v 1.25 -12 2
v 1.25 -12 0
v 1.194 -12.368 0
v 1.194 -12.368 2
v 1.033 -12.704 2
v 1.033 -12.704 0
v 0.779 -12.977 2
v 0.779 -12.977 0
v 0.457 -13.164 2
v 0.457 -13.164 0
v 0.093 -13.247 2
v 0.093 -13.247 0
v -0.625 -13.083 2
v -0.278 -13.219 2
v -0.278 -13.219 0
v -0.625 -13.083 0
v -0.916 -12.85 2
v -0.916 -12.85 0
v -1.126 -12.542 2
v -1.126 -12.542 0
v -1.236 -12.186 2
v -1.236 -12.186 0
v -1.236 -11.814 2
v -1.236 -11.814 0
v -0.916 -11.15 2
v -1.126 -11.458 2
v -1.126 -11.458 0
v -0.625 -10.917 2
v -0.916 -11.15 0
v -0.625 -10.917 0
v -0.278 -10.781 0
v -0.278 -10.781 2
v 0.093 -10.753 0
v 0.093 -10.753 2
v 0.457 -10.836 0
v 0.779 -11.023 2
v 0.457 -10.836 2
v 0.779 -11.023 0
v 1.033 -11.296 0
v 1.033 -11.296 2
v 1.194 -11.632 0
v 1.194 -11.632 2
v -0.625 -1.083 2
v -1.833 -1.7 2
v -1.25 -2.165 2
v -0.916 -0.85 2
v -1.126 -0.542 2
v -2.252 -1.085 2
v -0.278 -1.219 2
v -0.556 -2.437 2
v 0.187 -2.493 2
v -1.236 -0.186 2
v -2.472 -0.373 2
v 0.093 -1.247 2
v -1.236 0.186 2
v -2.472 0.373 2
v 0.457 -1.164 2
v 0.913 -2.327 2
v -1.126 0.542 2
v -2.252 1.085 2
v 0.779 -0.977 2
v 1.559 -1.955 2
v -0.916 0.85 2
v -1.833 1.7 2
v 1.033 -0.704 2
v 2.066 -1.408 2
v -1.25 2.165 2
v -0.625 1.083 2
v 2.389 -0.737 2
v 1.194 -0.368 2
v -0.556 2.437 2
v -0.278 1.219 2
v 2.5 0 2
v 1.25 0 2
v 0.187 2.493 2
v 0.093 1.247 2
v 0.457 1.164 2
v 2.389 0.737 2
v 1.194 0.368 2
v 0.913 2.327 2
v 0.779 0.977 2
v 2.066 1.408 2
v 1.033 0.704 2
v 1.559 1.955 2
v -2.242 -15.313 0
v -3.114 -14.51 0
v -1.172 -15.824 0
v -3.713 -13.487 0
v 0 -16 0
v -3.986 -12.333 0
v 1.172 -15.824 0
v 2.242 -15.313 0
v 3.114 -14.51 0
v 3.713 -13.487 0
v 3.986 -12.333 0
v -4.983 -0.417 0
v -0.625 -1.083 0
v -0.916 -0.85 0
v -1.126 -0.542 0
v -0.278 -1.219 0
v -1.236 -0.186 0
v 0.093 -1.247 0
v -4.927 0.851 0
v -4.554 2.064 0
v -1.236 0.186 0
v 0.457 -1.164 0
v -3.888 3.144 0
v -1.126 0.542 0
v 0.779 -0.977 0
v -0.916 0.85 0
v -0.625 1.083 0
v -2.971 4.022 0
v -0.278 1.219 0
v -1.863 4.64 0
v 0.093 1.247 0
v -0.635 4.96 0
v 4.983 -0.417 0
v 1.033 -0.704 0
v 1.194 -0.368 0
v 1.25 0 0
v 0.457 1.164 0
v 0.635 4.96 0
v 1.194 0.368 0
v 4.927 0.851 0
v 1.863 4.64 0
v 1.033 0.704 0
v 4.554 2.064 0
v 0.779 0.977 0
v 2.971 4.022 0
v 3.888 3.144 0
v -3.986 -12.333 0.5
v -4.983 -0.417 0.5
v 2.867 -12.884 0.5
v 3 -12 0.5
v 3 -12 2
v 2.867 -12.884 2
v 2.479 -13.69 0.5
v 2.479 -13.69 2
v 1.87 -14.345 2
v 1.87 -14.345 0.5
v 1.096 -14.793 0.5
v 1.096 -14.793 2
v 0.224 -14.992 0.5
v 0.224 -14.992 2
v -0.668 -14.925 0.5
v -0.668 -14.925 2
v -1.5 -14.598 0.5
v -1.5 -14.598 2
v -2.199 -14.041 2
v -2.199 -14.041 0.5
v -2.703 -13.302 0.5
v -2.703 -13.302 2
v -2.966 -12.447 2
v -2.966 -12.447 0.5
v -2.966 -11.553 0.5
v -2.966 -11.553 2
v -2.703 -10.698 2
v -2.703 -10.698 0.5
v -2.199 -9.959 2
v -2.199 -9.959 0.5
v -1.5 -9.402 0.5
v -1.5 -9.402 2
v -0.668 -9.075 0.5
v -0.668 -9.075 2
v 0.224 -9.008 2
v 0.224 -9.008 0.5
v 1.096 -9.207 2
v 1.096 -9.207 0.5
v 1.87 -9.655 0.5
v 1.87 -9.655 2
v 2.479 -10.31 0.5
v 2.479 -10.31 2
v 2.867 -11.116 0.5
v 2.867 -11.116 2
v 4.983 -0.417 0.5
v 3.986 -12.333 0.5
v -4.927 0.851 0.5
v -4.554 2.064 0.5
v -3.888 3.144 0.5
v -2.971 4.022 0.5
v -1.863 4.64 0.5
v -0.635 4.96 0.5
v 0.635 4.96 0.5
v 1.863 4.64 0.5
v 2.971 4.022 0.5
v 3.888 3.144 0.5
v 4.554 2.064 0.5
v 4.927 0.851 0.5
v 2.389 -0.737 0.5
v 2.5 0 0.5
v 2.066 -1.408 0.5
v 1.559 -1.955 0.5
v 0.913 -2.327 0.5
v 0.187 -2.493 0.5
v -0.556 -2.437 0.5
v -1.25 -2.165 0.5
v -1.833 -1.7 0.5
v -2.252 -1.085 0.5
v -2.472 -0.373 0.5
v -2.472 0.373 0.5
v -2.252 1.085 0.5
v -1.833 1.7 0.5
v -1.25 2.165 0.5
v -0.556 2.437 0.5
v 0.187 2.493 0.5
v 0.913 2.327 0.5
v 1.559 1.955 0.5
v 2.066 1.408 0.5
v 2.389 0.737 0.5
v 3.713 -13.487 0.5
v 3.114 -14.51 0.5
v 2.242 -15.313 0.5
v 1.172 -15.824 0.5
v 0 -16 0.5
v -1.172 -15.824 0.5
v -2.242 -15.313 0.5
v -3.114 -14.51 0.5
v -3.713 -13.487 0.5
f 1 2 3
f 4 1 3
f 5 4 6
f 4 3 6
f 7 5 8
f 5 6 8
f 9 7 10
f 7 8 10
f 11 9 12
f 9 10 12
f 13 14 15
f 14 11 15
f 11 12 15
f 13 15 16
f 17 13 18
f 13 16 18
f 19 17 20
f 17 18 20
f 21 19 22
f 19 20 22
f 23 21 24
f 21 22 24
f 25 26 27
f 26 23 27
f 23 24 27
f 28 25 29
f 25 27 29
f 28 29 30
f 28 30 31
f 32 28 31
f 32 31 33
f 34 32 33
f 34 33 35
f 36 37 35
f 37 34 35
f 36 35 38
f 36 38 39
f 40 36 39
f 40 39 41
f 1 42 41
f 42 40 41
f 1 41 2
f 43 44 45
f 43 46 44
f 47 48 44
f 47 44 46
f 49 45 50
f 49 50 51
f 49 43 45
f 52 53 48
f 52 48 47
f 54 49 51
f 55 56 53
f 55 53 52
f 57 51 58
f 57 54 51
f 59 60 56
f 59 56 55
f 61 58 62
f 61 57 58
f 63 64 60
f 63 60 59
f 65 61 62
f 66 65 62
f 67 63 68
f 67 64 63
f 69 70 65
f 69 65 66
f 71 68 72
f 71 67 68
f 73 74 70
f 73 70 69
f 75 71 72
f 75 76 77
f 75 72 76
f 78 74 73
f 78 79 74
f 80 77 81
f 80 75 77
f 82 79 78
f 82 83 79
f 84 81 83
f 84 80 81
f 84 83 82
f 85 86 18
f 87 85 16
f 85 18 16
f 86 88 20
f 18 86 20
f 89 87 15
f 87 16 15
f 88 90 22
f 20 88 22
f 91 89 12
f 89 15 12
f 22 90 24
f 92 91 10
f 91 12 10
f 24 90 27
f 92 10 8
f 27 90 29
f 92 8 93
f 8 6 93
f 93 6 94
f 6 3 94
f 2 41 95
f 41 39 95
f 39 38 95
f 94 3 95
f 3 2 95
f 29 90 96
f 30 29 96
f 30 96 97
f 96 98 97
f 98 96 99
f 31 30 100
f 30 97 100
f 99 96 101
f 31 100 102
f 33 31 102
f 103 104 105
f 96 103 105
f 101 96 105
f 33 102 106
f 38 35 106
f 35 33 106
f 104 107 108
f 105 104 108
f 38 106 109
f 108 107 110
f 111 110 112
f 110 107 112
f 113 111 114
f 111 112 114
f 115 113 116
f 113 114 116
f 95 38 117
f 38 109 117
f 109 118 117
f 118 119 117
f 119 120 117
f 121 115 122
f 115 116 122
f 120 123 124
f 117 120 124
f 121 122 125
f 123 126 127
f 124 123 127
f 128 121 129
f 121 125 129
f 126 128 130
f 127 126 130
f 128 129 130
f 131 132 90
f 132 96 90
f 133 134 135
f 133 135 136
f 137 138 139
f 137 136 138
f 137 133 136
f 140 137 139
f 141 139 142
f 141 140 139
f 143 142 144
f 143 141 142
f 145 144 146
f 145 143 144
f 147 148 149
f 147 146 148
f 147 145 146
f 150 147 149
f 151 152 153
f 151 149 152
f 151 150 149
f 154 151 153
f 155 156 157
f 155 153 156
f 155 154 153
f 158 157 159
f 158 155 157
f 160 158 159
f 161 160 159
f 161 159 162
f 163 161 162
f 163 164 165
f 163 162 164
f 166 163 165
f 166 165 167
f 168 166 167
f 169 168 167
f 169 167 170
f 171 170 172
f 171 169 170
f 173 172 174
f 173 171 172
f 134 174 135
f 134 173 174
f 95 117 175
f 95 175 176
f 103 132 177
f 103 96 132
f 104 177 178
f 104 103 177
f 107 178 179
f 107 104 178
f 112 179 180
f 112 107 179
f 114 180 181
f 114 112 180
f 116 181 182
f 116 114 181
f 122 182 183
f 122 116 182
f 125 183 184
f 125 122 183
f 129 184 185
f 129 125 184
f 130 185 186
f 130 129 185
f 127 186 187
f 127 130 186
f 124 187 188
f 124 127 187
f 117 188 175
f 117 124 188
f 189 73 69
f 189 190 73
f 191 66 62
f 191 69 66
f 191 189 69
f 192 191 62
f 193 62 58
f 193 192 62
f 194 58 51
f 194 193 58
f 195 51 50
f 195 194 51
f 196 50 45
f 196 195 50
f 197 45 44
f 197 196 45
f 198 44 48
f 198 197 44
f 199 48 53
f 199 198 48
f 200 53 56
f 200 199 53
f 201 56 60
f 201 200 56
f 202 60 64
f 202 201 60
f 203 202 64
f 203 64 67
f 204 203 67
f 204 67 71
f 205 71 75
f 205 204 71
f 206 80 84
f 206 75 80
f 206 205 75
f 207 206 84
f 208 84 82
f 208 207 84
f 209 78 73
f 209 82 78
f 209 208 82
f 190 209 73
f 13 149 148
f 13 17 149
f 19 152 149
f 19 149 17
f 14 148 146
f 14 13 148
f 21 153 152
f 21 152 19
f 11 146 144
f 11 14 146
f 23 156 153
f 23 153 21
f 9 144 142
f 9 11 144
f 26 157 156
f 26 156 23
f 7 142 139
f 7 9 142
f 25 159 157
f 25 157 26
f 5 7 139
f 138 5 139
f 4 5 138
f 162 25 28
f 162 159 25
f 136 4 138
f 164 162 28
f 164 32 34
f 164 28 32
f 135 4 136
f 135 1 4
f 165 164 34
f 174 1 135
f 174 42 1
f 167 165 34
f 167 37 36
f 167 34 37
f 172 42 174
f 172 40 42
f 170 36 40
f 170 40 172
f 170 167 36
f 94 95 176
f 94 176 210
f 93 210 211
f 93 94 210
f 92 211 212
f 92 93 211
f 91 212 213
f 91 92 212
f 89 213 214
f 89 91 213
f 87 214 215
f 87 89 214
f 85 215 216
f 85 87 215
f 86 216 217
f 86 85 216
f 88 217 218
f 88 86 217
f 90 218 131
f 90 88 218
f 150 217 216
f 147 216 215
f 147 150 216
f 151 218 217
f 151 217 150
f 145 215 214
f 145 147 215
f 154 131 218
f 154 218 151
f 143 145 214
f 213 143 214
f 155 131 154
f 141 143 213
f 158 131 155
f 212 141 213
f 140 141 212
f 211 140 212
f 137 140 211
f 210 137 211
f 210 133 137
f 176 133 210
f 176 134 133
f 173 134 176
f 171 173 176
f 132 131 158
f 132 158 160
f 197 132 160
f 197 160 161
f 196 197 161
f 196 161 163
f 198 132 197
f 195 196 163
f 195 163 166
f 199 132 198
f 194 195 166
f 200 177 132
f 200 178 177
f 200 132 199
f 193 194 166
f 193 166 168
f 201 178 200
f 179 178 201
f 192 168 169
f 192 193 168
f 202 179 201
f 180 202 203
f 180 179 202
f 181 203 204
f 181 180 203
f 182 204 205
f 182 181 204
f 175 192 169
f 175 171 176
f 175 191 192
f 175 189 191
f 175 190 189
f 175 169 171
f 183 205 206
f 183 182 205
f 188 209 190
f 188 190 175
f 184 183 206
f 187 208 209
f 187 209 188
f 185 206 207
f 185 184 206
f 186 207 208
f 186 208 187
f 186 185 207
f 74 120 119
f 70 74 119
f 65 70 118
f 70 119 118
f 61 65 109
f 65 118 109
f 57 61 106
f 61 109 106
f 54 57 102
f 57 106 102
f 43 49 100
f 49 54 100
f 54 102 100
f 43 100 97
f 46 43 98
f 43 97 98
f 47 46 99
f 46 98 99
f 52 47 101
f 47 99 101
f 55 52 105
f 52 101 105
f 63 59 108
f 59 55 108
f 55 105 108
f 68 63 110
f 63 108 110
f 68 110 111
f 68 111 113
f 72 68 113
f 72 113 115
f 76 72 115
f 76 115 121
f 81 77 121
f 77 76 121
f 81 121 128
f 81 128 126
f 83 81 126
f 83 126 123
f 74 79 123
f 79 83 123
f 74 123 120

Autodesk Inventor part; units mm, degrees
ref_plane "YZ Plane" through (0, 0, 0) normal (1, 0, 0) x (0, 1, 0)
ref_plane "XZ Plane" through (0, 0, 0) normal (0, 1, 0) x (-1, 0, 0)
ref_plane "XY Plane" through (0, 0, 0) normal (0, 0, 1) x (1, 0, 0)
sketch "スケッチ1" plane through (0, 0, 0) normal (0, 0, 1) x (1, 0, 0)
  circle A0 centre (0, 0) radius 5
  circle A1 centre (0, -25) radius 10 construction
  spline S0 degree 4 number of poles 181
  arc A2 (-34.6019, -43.3635) -> (-36.604, -46.8264) centre (-35.6029, -45.0949) ccw
  line L0 (-36.604, -46.8264) -> (-35.6029, -45.0949) construction
  line L1 (-34.6019, -43.3635) -> (-35.6029, -45.0949) construction
  arc A3 (9.9747, -25.7104) -> (36.4435, -41.8861) centre (27.3937, -26.9509) ccw
  arc A4 (-34.6019, -43.3635) -> (-9.8865, -26.5022) centre (-26.2949, -28.9953) ccw
  line L2 (-4.899, 1) -> (-9.798, -23) construction
  line L3 (4.899, 1) -> (9.798, -23) construction
  circle A5 centre (0, 0) radius 2.5
  circle A6 centre (0, 0) radius 1.25
  circle A7 centre (0, -12) radius 1.25
  circle A8 centre (0, -12) radius 3
  circle A9 centre (0, -12) radius 4.255 construction
  line L4 (-3.817, -10.1196) -> (-8.9705, -20.5808) construction
  line L5 (3.817, -10.1196) -> (8.9705, -20.5808) construction
  circle A10 centre (0, -25) radius 7.025 construction
  circle A11 centre (0, -12) radius 4
  line L6 (17.164, -48.1611) -> (13.7217, -46.1237)
  line L7 (13.7217, -46.1237) -> (15.7591, -42.6814)
  line L8 (15.7591, -42.6814) -> (19.2014, -44.7188)
  line L9 (19.2014, -44.7188) -> (17.164, -48.1611)
  line L10 (-17.2597, -45.3722) -> (-13.9841, -43.0765)
  line L11 (-13.9841, -43.0765) -> (-11.6884, -46.3522)
  line L12 (-11.6884, -46.3522) -> (-14.964, -48.6478)
  line L13 (-14.964, -48.6478) -> (-17.2597, -45.3722)
  line L14 (15.4429, -47.1424) -> (17.4802, -43.7001) construction
  line L15 (-15.6219, -44.2243) -> (-13.3262, -47.5) construction
  arc A12 (38.5164, -45.3071) -> (36.4435, -41.8861) centre (37.48, -43.5966) ccw
  line L16 (38.5164, -45.3071) -> (37.48, -43.5966) construction
  line L17 (36.4435, -41.8861) -> (37.48, -43.5966) construction
  line L18 (-5.2079, 2.2776) -> (-3.9861, -12.3333)
  line L19 (4.9826, -0.4167) -> (3.9861, -12.3333)
  point P0 (38.0735, -45.574)
  point P1 (37.6323, -45.8368)
  point P2 (37.1929, -46.0956)
  point P3 (36.755, -46.3505)
  point P4 (36.3186, -46.6016)
  point P5 (35.8837, -46.8488)
  point P6 (35.4502, -47.0924)
  point P7 (35.0179, -47.3322)
  point P8 (34.5869, -47.5685)
  point P9 (34.157, -47.8012)
  point P10 (33.7283, -48.0304)
  point P11 (33.3005, -48.2561)
  point P12 (32.8738, -48.4785)
  point P13 (32.4479, -48.6974)
  point P14 (32.023, -48.9131)
  point P15 (31.5988, -49.1254)
  point P16 (31.1754, -49.3346)
  point P17 (30.7527, -49.5405)
  point P18 (30.3307, -49.7432)
  point P19 (29.9093, -49.9428)
  point P20 (29.4885, -50.1393)
  point P21 (29.0683, -50.3328)
  point P22 (28.6485, -50.5231)
  point P23 (28.2292, -50.7105)
  point P24 (27.8103, -50.8948)
  point P25 (27.3918, -51.0762)
  point P26 (26.9737, -51.2547)
  point P27 (26.5559, -51.4302)
  point P28 (26.1384, -51.6028)
  point P29 (25.7211, -51.7725)
  point P30 (25.3041, -51.9393)
  point P31 (24.8874, -52.1033)
  point P32 (24.4708, -52.2644)
  point P33 (24.0544, -52.4227)
  point P34 (23.6381, -52.5782)
  point P35 (23.2219, -52.731)
  point P36 (22.8059, -52.8809)
  point P37 (22.39, -53.028)
  point P38 (21.9741, -53.1724)
  point P39 (21.5582, -53.3141)
  point P40 (21.1424, -53.453)
  point P41 (20.7266, -53.5892)
  point P42 (20.3109, -53.7226)
  point P43 (19.8951, -53.8534)
  point P44 (19.4793, -53.9814)
  point P45 (19.0635, -54.1068)
  point P46 (18.6476, -54.2294)
  point P47 (18.2317, -54.3494)
  point P48 (17.8157, -54.4666)
  point P49 (17.3997, -54.5812)
  point P50 (16.9836, -54.6931)
  point P51 (16.5674, -54.8024)
  point P52 (16.1511, -54.909)
  point P53 (15.7347, -55.0129)
  point P54 (15.3182, -55.1141)
  point P55 (14.9017, -55.2128)
  point P56 (14.485, -55.3087)
  point P57 (14.0682, -55.402)
  point P58 (13.6513, -55.4927)
  point P59 (13.2343, -55.5807)
  point P60 (12.8172, -55.666)
  point P61 (12.3999, -55.7487)
  point P62 (11.9826, -55.8288)
  point P63 (11.5651, -55.9062)
  point P64 (11.1476, -55.981)
  point P65 (10.7299, -56.0532)
  point P66 (10.3121, -56.1227)
  point P67 (9.8942, -56.1895)
  point P68 (9.4762, -56.2538)
  point P69 (9.0581, -56.3154)
  point P70 (8.6399, -56.3743)
  point P71 (8.2216, -56.4306)
  point P72 (7.8032, -56.4843)
  point P73 (7.3847, -56.5353)
  point P74 (6.9661, -56.5837)
  point P75 (6.5474, -56.6295)
  point P76 (6.1287, -56.6726)
  point P77 (5.7099, -56.7131)
  point P78 (5.2911, -56.751)
  point P79 (4.8721, -56.7862)
  point P80 (4.4532, -56.8187)
  point P81 (4.0341, -56.8487)
  point P82 (3.6151, -56.876)
  point P83 (3.196, -56.9006)
  point P84 (2.7768, -56.9226)
  point P85 (2.3577, -56.942)
  point P86 (1.9385, -56.9588)
  point P87 (1.5194, -56.9728)
  point P88 (1.1002, -56.9843)
  point P89 (0.681, -56.9931)
  point P90 (0.2619, -56.9993)
  point P91 (-0.1572, -57.0028)
  point P92 (-0.5763, -57.0037)
  point P93 (-0.9954, -57.002)
  point P94 (-1.4144, -56.9976)
  point P95 (-1.8334, -56.9906)
  point P96 (-2.2523, -56.9809)
  point P97 (-2.6711, -56.9686)
  point P98 (-3.0898, -56.9537)
  point P99 (-3.5085, -56.9361)
  point P100 (-3.9271, -56.9159)
  point P101 (-4.3456, -56.893)
  point P102 (-4.764, -56.8675)
  point P103 (-5.1822, -56.8394)
  point P104 (-5.6004, -56.8086)
  point P105 (-6.0184, -56.7752)
  point P106 (-6.4363, -56.7391)
  point P107 (-6.854, -56.7004)
  point P108 (-7.2716, -56.6591)
  point P109 (-7.689, -56.6152)
  point P110 (-8.1063, -56.5686)
  point P111 (-8.5234, -56.5194)
  point P112 (-8.9403, -56.4675)
  point P113 (-9.357, -56.413)
  point P114 (-9.7736, -56.3559)
  point P115 (-10.1899, -56.2961)
  point P116 (-10.6061, -56.2337)
  point P117 (-11.022, -56.1687)
  point P118 (-11.4378, -56.1011)
  point P119 (-11.8533, -56.0308)
  point P120 (-12.2686, -55.9579)
  point P121 (-12.6837, -55.8823)
  point P122 (-13.0985, -55.8041)
  point P123 (-13.5132, -55.7233)
  point P124 (-13.9276, -55.6399)
  point P125 (-14.3417, -55.5538)
  point P126 (-14.7557, -55.4651)
  point P127 (-15.1694, -55.3738)
  point P128 (-15.5828, -55.2798)
  point P129 (-15.996, -55.1832)
  point P130 (-16.409, -55.084)
  point P131 (-16.8217, -54.9821)
  point P132 (-17.2342, -54.8776)
  point P133 (-17.6465, -54.7704)
  point P134 (-18.0585, -54.6606)
  point P135 (-18.4703, -54.5482)
  point P136 (-18.8818, -54.4331)
  point P137 (-19.2932, -54.3154)
  point P138 (-19.7043, -54.195)
  point P139 (-20.1152, -54.0719)
  point P140 (-20.5259, -53.9462)
  point P141 (-20.9364, -53.8179)
  point P142 (-21.3468, -53.6868)
  point P143 (-21.7569, -53.5531)
  point P144 (-22.1669, -53.4167)
  point P145 (-22.5767, -53.2776)
  point P146 (-22.9864, -53.1358)
  point P147 (-23.3959, -52.9913)
  point P148 (-23.8053, -52.8441)
  point P149 (-24.2147, -52.6941)
  point P150 (-24.6239, -52.5414)
  point P151 (-25.0331, -52.386)
  point P152 (-25.4422, -52.2278)
  point P153 (-25.8514, -52.0669)
  point P154 (-26.2605, -51.9031)
  point P155 (-26.6697, -51.7366)
  point P156 (-27.0789, -51.5672)
  point P157 (-27.4882, -51.395)
  point P158 (-27.8976, -51.2199)
  point P159 (-28.3071, -51.0419)
  point P160 (-28.7169, -50.8611)
  point P161 (-29.1269, -50.6773)
  point P162 (-29.5371, -50.4905)
  point P163 (-29.9476, -50.3008)
  point P164 (-30.3585, -50.1081)
  point P165 (-30.7698, -49.9123)
  point P166 (-31.1815, -49.7134)
  point P167 (-31.5937, -49.5114)
  point P168 (-32.0065, -49.3063)
  point P169 (-32.4199, -49.0979)
  point P170 (-32.8339, -48.8863)
  point P171 (-33.2488, -48.6714)
  point P172 (-33.6644, -48.4532)
  point P173 (-34.081, -48.2315)
  point P174 (-34.4985, -48.0064)
  point P175 (-34.9171, -47.7778)
  point P176 (-35.3368, -47.5455)
  point P177 (-35.7578, -47.3096)
  point P178 (-36.1802, -47.0699)
  point P179 (-4.9826, -0.4167)
  dimension "d0" = 10
  dimension "d1" = 20
  dimension "d2" = 2
  dimension "d3" = 180
  dimension "d4" = 25
  dimension "d5" = 5
  dimension "d6" = 2.5
  dimension "d7" = 2.5
  dimension "d8" = 6
  dimension "d9" = 8.51
  dimension "d10" = 12
  dimension "d11" = 14.05
  dimension "d12" = 8
  dimension "d13" = 4
  dimension "d14" = 4
  dimension "d15" = 4
  dimension "d16" = 4
  dimension "d17" = 16.5967
  dimension "d18" = 17.4631
  dimension "d19" = 18.5967
  dimension "d20" = 19.4631
  dimension "d21" = 20
  dimension "d22" = 2
  dimension "d23" = 180
  dimension "d24" = 20
extrude "押し出し1" add sketch "スケッチ1" along normal blind 0.5 contours A0 | L19 A11 L18 A0 | A11
extrude "押し出し2" add sketch "スケッチ1" along normal blind 2 contours A5 | A8
equation "\"d4\" = d25"
equation "\"d6\" = d7"
equation "\"d25\" = 25"
properties part number "揺動節抑え" material "アルミニウム 2014-T4"
